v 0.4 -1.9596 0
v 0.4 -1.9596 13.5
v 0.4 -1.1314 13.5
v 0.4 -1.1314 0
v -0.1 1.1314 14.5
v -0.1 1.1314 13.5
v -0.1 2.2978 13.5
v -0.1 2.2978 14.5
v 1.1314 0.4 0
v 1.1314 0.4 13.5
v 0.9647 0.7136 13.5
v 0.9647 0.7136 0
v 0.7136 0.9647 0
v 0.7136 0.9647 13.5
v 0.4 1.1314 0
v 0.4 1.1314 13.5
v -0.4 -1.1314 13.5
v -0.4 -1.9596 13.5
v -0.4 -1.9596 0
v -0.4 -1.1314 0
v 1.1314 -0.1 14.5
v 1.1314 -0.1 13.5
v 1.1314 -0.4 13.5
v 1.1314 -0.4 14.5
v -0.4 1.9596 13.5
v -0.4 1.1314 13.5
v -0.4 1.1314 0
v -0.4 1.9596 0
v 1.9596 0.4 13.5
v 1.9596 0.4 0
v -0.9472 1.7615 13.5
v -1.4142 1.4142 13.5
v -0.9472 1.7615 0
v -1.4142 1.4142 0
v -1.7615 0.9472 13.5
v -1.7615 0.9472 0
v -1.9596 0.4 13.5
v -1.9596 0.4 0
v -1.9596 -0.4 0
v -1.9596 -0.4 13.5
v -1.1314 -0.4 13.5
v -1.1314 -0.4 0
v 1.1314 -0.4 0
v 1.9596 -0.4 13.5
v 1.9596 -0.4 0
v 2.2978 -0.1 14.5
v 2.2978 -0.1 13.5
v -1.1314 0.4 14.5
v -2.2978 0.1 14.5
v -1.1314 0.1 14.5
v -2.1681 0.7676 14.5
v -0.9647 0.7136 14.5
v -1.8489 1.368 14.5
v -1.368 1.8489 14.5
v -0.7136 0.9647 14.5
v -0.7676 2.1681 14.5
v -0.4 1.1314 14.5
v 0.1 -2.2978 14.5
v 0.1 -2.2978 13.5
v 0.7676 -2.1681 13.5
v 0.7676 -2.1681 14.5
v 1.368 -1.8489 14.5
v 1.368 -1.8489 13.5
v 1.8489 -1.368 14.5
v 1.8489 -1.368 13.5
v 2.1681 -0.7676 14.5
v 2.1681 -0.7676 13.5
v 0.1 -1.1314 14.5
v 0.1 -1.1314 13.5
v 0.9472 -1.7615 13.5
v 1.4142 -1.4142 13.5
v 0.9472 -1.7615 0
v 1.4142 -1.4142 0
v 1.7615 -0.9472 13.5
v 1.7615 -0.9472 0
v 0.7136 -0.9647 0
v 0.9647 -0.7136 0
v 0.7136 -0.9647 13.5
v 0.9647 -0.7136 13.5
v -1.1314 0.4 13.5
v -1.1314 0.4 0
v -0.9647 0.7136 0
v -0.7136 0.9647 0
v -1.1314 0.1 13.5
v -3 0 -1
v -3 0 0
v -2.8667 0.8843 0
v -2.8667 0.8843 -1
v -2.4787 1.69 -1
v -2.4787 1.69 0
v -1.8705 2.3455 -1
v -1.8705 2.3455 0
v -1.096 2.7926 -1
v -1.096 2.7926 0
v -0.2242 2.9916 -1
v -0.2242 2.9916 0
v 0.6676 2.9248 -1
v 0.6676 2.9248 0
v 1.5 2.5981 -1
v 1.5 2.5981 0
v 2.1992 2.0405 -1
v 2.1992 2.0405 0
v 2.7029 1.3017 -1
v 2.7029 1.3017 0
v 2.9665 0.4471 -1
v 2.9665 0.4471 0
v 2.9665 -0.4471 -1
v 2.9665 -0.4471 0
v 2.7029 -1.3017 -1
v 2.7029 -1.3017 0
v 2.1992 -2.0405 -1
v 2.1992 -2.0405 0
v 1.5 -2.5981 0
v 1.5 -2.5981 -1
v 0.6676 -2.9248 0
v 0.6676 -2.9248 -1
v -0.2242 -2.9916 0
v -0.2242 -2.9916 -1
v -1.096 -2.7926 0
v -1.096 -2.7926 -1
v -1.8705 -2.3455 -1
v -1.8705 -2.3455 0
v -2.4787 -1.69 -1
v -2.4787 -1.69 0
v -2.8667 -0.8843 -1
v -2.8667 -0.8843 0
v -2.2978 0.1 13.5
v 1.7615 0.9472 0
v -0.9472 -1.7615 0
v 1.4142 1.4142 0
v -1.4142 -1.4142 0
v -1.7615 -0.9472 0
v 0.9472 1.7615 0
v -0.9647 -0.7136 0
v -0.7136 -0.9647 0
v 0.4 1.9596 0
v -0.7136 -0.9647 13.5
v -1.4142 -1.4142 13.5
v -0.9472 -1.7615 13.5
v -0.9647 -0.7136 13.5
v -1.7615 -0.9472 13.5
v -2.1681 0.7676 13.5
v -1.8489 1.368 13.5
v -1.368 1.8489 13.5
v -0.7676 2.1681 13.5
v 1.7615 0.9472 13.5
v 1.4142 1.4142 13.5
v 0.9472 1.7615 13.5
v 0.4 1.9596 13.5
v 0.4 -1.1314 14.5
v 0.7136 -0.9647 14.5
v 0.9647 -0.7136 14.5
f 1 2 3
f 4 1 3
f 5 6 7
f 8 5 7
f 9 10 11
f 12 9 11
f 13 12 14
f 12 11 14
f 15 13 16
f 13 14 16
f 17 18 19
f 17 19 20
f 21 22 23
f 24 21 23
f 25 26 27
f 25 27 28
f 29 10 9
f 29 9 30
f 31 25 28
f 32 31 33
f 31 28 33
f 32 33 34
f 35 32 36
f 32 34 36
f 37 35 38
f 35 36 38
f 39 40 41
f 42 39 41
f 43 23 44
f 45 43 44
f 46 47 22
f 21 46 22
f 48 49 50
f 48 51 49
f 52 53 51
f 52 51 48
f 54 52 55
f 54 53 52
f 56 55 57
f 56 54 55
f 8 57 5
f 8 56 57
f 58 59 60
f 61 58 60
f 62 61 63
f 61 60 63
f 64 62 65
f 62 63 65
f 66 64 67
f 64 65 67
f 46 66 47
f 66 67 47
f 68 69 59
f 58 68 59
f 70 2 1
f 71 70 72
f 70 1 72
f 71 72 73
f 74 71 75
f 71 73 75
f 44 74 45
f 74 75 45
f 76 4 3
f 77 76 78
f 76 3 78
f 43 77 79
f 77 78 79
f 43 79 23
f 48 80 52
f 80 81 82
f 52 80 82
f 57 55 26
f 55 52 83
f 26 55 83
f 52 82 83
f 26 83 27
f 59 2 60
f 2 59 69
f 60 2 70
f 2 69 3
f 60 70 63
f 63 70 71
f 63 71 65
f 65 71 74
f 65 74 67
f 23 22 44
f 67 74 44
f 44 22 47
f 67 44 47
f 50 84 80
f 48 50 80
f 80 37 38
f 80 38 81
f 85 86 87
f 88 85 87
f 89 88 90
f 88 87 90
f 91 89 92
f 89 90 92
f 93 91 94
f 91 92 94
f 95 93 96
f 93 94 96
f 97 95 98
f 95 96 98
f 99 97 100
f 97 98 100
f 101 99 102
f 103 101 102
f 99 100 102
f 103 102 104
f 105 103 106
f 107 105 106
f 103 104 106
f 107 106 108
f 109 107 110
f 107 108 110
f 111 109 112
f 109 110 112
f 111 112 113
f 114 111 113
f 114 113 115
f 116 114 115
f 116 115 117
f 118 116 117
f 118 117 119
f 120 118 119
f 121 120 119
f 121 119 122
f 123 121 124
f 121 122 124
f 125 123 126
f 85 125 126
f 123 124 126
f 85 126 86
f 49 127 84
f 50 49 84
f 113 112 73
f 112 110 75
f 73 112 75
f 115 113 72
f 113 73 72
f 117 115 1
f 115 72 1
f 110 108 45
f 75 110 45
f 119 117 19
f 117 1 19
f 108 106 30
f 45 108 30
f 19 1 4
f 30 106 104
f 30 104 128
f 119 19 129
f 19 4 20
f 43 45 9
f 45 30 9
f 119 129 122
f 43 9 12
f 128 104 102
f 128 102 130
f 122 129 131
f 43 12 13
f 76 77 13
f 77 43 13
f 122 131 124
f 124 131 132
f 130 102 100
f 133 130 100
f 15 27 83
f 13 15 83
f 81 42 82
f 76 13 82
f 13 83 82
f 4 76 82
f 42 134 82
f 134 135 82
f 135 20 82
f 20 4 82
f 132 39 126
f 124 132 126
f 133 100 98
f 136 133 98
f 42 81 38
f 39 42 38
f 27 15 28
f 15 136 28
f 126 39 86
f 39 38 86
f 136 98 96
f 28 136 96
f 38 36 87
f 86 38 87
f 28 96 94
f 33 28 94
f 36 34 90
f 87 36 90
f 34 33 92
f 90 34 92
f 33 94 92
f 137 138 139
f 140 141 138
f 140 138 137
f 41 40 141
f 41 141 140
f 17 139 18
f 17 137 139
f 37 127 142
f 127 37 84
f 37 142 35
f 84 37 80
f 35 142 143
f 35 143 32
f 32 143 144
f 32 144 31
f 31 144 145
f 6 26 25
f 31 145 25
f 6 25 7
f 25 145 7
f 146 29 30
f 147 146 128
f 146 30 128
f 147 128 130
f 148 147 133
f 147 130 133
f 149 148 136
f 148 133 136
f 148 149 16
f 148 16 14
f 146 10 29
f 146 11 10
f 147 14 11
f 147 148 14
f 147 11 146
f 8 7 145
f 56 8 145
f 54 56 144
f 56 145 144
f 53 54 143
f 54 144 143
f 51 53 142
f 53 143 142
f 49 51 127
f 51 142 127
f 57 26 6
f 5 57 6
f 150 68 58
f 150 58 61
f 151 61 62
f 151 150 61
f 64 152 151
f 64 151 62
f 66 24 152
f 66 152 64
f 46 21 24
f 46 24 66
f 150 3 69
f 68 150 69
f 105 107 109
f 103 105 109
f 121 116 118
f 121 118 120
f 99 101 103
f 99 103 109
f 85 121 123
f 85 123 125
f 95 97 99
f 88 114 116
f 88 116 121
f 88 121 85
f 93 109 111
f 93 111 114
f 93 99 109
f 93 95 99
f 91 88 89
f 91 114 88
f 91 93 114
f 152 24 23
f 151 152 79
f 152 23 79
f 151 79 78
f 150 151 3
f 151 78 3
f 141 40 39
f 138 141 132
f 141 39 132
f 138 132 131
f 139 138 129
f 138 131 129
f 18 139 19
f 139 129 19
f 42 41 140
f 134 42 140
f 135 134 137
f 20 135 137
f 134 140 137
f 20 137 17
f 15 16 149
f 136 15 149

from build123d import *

# Parameters (mm, degrees)
SKETCH1_R           = 2
BOSS_EXTRUDE1_DEPTH = 13.5
SKETCH2_R           = 1.2
CUT_EXTRUDE1_DEPTH  = 14.793114224
SKETCH3_W           = 0.8
SKETCH3_H           = 6.59267807
SKETCH3_W_2         = 7.006923124
SKETCH3_H_2         = 0.8
CUT_EXTRUDE3_DEPTH  = 14.793114224
BOSS_EXTRUDE2_DEPTH = 1
SKETCH5_R           = 3
BOSS_EXTRUDE3_DEPTH = 1


with BuildPart() as part:
    # Sketch1 → Boss-Extrude1 (new body)
    with BuildSketch(Plane.XY):
        Circle(SKETCH1_R)
    extrude(amount=BOSS_EXTRUDE1_DEPTH)

    # Sketch2 → Cut-Extrude1 (cut, through all)
    with BuildSketch(Plane.XY.offset(13.5)):
        Circle(SKETCH2_R)
    extrude(amount=-CUT_EXTRUDE1_DEPTH, mode=Mode.SUBTRACT)

    # Sketch3 → Cut-Extrude3 (cut, through all)
    with BuildSketch(Plane.XY.offset(13.5)):
        Rectangle(SKETCH3_W, SKETCH3_H)
        Rectangle(SKETCH3_W_2, SKETCH3_H_2)
    extrude(amount=-CUT_EXTRUDE3_DEPTH, mode=Mode.SUBTRACT)


with BuildPart() as cut_extrude3_piece_1:
    # of the separate pieces the step leaves, piece 1, a body of its own (cut_extrude3_pieces)
    add(part.part.solids().sort_by_distance((1.959591794, 0.4, 0))[0])



with BuildPart() as cut_extrude3_piece_2:
    # of the separate pieces the step leaves, piece 2, a body of its own (cut_extrude3_pieces)
    add(part.part.solids().sort_by_distance((0.4, -1.959591794, 0))[0])



with BuildPart() as cut_extrude3_piece_3:
    # of the separate pieces the step leaves, piece 3, a body of its own (cut_extrude3_pieces)
    add(part.part.solids().sort_by_distance((-1.959591794, -0.4, 0))[0])


with BuildPart() as cut_extrude3_piece_4:
    # of the separate pieces the step leaves, piece 4, a body of its own (cut_extrude3_pieces)
    add(part.part.solids().sort_by_distance((-0.4, 1.959591794, 0))[0])


with BuildPart() as cut_extrude3_piece_2_1:
    add(cut_extrude3_piece_2.part)

    add(cut_extrude3_piece_4.part)  # Boss-Extrude2 merges Cut-Extrude3 piece 4
    # Sketch4 → Boss-Extrude2 (add)
    with BuildSketch(Plane.XY.offset(13.5)):
        with BuildLine():
            Line((-2.297825059, 0.1), (-1.13137085, 0.1))
            Line((-1.13137085, 0.1), (-1.13137085, 0.4))
            ThreePointArc((-1.13137085, 0.4), (-0.848528137, 0.848528137), (-0.4, 1.13137085))
            Line((-0.4, 1.13137085), (-0.1, 1.13137085))
            Line((-0.1, 1.13137085), (-0.1, 2.297825059))
            ThreePointArc((-0.1, 2.297825059), (-1.626345597, 1.626345597), (-2.297825059, 0.1))
        make_face()
        with BuildLine():
            Line((0.1, -1.13137085), (0.1, -2.297825059))
            ThreePointArc((0.1, -2.297825059), (1.626345597, -1.626345597), (2.297825059, -0.1))
            Line((2.297825059, -0.1), (1.13137085, -0.1))
            Line((1.13137085, -0.1), (1.13137085, -0.4))
            ThreePointArc((1.13137085, -0.4), (0.848528137, -0.848528137), (0.4, -1.13137085))
            Line((0.4, -1.13137085), (0.1, -1.13137085))
        make_face()
    extrude(amount=BOSS_EXTRUDE2_DEPTH)


with BuildPart() as cut_extrude3_piece_1_1:
    add(cut_extrude3_piece_1.part)

    add(cut_extrude3_piece_2_1.part)  # Boss-Extrude3 merges Cut-Extrude3 piece 2

    add(cut_extrude3_piece_3.part)  # Boss-Extrude3 merges Cut-Extrude3 piece 3
    # Sketch5 → Boss-Extrude3 (add)
    with BuildSketch(Plane(origin=(0, 0, 0), x_dir=(-1, 0, 0), z_dir=(0, 0, -1))):
        Circle(SKETCH5_R)
    extrude(amount=BOSS_EXTRUDE3_DEPTH)


solid = cut_extrude3_piece_1_1.part
